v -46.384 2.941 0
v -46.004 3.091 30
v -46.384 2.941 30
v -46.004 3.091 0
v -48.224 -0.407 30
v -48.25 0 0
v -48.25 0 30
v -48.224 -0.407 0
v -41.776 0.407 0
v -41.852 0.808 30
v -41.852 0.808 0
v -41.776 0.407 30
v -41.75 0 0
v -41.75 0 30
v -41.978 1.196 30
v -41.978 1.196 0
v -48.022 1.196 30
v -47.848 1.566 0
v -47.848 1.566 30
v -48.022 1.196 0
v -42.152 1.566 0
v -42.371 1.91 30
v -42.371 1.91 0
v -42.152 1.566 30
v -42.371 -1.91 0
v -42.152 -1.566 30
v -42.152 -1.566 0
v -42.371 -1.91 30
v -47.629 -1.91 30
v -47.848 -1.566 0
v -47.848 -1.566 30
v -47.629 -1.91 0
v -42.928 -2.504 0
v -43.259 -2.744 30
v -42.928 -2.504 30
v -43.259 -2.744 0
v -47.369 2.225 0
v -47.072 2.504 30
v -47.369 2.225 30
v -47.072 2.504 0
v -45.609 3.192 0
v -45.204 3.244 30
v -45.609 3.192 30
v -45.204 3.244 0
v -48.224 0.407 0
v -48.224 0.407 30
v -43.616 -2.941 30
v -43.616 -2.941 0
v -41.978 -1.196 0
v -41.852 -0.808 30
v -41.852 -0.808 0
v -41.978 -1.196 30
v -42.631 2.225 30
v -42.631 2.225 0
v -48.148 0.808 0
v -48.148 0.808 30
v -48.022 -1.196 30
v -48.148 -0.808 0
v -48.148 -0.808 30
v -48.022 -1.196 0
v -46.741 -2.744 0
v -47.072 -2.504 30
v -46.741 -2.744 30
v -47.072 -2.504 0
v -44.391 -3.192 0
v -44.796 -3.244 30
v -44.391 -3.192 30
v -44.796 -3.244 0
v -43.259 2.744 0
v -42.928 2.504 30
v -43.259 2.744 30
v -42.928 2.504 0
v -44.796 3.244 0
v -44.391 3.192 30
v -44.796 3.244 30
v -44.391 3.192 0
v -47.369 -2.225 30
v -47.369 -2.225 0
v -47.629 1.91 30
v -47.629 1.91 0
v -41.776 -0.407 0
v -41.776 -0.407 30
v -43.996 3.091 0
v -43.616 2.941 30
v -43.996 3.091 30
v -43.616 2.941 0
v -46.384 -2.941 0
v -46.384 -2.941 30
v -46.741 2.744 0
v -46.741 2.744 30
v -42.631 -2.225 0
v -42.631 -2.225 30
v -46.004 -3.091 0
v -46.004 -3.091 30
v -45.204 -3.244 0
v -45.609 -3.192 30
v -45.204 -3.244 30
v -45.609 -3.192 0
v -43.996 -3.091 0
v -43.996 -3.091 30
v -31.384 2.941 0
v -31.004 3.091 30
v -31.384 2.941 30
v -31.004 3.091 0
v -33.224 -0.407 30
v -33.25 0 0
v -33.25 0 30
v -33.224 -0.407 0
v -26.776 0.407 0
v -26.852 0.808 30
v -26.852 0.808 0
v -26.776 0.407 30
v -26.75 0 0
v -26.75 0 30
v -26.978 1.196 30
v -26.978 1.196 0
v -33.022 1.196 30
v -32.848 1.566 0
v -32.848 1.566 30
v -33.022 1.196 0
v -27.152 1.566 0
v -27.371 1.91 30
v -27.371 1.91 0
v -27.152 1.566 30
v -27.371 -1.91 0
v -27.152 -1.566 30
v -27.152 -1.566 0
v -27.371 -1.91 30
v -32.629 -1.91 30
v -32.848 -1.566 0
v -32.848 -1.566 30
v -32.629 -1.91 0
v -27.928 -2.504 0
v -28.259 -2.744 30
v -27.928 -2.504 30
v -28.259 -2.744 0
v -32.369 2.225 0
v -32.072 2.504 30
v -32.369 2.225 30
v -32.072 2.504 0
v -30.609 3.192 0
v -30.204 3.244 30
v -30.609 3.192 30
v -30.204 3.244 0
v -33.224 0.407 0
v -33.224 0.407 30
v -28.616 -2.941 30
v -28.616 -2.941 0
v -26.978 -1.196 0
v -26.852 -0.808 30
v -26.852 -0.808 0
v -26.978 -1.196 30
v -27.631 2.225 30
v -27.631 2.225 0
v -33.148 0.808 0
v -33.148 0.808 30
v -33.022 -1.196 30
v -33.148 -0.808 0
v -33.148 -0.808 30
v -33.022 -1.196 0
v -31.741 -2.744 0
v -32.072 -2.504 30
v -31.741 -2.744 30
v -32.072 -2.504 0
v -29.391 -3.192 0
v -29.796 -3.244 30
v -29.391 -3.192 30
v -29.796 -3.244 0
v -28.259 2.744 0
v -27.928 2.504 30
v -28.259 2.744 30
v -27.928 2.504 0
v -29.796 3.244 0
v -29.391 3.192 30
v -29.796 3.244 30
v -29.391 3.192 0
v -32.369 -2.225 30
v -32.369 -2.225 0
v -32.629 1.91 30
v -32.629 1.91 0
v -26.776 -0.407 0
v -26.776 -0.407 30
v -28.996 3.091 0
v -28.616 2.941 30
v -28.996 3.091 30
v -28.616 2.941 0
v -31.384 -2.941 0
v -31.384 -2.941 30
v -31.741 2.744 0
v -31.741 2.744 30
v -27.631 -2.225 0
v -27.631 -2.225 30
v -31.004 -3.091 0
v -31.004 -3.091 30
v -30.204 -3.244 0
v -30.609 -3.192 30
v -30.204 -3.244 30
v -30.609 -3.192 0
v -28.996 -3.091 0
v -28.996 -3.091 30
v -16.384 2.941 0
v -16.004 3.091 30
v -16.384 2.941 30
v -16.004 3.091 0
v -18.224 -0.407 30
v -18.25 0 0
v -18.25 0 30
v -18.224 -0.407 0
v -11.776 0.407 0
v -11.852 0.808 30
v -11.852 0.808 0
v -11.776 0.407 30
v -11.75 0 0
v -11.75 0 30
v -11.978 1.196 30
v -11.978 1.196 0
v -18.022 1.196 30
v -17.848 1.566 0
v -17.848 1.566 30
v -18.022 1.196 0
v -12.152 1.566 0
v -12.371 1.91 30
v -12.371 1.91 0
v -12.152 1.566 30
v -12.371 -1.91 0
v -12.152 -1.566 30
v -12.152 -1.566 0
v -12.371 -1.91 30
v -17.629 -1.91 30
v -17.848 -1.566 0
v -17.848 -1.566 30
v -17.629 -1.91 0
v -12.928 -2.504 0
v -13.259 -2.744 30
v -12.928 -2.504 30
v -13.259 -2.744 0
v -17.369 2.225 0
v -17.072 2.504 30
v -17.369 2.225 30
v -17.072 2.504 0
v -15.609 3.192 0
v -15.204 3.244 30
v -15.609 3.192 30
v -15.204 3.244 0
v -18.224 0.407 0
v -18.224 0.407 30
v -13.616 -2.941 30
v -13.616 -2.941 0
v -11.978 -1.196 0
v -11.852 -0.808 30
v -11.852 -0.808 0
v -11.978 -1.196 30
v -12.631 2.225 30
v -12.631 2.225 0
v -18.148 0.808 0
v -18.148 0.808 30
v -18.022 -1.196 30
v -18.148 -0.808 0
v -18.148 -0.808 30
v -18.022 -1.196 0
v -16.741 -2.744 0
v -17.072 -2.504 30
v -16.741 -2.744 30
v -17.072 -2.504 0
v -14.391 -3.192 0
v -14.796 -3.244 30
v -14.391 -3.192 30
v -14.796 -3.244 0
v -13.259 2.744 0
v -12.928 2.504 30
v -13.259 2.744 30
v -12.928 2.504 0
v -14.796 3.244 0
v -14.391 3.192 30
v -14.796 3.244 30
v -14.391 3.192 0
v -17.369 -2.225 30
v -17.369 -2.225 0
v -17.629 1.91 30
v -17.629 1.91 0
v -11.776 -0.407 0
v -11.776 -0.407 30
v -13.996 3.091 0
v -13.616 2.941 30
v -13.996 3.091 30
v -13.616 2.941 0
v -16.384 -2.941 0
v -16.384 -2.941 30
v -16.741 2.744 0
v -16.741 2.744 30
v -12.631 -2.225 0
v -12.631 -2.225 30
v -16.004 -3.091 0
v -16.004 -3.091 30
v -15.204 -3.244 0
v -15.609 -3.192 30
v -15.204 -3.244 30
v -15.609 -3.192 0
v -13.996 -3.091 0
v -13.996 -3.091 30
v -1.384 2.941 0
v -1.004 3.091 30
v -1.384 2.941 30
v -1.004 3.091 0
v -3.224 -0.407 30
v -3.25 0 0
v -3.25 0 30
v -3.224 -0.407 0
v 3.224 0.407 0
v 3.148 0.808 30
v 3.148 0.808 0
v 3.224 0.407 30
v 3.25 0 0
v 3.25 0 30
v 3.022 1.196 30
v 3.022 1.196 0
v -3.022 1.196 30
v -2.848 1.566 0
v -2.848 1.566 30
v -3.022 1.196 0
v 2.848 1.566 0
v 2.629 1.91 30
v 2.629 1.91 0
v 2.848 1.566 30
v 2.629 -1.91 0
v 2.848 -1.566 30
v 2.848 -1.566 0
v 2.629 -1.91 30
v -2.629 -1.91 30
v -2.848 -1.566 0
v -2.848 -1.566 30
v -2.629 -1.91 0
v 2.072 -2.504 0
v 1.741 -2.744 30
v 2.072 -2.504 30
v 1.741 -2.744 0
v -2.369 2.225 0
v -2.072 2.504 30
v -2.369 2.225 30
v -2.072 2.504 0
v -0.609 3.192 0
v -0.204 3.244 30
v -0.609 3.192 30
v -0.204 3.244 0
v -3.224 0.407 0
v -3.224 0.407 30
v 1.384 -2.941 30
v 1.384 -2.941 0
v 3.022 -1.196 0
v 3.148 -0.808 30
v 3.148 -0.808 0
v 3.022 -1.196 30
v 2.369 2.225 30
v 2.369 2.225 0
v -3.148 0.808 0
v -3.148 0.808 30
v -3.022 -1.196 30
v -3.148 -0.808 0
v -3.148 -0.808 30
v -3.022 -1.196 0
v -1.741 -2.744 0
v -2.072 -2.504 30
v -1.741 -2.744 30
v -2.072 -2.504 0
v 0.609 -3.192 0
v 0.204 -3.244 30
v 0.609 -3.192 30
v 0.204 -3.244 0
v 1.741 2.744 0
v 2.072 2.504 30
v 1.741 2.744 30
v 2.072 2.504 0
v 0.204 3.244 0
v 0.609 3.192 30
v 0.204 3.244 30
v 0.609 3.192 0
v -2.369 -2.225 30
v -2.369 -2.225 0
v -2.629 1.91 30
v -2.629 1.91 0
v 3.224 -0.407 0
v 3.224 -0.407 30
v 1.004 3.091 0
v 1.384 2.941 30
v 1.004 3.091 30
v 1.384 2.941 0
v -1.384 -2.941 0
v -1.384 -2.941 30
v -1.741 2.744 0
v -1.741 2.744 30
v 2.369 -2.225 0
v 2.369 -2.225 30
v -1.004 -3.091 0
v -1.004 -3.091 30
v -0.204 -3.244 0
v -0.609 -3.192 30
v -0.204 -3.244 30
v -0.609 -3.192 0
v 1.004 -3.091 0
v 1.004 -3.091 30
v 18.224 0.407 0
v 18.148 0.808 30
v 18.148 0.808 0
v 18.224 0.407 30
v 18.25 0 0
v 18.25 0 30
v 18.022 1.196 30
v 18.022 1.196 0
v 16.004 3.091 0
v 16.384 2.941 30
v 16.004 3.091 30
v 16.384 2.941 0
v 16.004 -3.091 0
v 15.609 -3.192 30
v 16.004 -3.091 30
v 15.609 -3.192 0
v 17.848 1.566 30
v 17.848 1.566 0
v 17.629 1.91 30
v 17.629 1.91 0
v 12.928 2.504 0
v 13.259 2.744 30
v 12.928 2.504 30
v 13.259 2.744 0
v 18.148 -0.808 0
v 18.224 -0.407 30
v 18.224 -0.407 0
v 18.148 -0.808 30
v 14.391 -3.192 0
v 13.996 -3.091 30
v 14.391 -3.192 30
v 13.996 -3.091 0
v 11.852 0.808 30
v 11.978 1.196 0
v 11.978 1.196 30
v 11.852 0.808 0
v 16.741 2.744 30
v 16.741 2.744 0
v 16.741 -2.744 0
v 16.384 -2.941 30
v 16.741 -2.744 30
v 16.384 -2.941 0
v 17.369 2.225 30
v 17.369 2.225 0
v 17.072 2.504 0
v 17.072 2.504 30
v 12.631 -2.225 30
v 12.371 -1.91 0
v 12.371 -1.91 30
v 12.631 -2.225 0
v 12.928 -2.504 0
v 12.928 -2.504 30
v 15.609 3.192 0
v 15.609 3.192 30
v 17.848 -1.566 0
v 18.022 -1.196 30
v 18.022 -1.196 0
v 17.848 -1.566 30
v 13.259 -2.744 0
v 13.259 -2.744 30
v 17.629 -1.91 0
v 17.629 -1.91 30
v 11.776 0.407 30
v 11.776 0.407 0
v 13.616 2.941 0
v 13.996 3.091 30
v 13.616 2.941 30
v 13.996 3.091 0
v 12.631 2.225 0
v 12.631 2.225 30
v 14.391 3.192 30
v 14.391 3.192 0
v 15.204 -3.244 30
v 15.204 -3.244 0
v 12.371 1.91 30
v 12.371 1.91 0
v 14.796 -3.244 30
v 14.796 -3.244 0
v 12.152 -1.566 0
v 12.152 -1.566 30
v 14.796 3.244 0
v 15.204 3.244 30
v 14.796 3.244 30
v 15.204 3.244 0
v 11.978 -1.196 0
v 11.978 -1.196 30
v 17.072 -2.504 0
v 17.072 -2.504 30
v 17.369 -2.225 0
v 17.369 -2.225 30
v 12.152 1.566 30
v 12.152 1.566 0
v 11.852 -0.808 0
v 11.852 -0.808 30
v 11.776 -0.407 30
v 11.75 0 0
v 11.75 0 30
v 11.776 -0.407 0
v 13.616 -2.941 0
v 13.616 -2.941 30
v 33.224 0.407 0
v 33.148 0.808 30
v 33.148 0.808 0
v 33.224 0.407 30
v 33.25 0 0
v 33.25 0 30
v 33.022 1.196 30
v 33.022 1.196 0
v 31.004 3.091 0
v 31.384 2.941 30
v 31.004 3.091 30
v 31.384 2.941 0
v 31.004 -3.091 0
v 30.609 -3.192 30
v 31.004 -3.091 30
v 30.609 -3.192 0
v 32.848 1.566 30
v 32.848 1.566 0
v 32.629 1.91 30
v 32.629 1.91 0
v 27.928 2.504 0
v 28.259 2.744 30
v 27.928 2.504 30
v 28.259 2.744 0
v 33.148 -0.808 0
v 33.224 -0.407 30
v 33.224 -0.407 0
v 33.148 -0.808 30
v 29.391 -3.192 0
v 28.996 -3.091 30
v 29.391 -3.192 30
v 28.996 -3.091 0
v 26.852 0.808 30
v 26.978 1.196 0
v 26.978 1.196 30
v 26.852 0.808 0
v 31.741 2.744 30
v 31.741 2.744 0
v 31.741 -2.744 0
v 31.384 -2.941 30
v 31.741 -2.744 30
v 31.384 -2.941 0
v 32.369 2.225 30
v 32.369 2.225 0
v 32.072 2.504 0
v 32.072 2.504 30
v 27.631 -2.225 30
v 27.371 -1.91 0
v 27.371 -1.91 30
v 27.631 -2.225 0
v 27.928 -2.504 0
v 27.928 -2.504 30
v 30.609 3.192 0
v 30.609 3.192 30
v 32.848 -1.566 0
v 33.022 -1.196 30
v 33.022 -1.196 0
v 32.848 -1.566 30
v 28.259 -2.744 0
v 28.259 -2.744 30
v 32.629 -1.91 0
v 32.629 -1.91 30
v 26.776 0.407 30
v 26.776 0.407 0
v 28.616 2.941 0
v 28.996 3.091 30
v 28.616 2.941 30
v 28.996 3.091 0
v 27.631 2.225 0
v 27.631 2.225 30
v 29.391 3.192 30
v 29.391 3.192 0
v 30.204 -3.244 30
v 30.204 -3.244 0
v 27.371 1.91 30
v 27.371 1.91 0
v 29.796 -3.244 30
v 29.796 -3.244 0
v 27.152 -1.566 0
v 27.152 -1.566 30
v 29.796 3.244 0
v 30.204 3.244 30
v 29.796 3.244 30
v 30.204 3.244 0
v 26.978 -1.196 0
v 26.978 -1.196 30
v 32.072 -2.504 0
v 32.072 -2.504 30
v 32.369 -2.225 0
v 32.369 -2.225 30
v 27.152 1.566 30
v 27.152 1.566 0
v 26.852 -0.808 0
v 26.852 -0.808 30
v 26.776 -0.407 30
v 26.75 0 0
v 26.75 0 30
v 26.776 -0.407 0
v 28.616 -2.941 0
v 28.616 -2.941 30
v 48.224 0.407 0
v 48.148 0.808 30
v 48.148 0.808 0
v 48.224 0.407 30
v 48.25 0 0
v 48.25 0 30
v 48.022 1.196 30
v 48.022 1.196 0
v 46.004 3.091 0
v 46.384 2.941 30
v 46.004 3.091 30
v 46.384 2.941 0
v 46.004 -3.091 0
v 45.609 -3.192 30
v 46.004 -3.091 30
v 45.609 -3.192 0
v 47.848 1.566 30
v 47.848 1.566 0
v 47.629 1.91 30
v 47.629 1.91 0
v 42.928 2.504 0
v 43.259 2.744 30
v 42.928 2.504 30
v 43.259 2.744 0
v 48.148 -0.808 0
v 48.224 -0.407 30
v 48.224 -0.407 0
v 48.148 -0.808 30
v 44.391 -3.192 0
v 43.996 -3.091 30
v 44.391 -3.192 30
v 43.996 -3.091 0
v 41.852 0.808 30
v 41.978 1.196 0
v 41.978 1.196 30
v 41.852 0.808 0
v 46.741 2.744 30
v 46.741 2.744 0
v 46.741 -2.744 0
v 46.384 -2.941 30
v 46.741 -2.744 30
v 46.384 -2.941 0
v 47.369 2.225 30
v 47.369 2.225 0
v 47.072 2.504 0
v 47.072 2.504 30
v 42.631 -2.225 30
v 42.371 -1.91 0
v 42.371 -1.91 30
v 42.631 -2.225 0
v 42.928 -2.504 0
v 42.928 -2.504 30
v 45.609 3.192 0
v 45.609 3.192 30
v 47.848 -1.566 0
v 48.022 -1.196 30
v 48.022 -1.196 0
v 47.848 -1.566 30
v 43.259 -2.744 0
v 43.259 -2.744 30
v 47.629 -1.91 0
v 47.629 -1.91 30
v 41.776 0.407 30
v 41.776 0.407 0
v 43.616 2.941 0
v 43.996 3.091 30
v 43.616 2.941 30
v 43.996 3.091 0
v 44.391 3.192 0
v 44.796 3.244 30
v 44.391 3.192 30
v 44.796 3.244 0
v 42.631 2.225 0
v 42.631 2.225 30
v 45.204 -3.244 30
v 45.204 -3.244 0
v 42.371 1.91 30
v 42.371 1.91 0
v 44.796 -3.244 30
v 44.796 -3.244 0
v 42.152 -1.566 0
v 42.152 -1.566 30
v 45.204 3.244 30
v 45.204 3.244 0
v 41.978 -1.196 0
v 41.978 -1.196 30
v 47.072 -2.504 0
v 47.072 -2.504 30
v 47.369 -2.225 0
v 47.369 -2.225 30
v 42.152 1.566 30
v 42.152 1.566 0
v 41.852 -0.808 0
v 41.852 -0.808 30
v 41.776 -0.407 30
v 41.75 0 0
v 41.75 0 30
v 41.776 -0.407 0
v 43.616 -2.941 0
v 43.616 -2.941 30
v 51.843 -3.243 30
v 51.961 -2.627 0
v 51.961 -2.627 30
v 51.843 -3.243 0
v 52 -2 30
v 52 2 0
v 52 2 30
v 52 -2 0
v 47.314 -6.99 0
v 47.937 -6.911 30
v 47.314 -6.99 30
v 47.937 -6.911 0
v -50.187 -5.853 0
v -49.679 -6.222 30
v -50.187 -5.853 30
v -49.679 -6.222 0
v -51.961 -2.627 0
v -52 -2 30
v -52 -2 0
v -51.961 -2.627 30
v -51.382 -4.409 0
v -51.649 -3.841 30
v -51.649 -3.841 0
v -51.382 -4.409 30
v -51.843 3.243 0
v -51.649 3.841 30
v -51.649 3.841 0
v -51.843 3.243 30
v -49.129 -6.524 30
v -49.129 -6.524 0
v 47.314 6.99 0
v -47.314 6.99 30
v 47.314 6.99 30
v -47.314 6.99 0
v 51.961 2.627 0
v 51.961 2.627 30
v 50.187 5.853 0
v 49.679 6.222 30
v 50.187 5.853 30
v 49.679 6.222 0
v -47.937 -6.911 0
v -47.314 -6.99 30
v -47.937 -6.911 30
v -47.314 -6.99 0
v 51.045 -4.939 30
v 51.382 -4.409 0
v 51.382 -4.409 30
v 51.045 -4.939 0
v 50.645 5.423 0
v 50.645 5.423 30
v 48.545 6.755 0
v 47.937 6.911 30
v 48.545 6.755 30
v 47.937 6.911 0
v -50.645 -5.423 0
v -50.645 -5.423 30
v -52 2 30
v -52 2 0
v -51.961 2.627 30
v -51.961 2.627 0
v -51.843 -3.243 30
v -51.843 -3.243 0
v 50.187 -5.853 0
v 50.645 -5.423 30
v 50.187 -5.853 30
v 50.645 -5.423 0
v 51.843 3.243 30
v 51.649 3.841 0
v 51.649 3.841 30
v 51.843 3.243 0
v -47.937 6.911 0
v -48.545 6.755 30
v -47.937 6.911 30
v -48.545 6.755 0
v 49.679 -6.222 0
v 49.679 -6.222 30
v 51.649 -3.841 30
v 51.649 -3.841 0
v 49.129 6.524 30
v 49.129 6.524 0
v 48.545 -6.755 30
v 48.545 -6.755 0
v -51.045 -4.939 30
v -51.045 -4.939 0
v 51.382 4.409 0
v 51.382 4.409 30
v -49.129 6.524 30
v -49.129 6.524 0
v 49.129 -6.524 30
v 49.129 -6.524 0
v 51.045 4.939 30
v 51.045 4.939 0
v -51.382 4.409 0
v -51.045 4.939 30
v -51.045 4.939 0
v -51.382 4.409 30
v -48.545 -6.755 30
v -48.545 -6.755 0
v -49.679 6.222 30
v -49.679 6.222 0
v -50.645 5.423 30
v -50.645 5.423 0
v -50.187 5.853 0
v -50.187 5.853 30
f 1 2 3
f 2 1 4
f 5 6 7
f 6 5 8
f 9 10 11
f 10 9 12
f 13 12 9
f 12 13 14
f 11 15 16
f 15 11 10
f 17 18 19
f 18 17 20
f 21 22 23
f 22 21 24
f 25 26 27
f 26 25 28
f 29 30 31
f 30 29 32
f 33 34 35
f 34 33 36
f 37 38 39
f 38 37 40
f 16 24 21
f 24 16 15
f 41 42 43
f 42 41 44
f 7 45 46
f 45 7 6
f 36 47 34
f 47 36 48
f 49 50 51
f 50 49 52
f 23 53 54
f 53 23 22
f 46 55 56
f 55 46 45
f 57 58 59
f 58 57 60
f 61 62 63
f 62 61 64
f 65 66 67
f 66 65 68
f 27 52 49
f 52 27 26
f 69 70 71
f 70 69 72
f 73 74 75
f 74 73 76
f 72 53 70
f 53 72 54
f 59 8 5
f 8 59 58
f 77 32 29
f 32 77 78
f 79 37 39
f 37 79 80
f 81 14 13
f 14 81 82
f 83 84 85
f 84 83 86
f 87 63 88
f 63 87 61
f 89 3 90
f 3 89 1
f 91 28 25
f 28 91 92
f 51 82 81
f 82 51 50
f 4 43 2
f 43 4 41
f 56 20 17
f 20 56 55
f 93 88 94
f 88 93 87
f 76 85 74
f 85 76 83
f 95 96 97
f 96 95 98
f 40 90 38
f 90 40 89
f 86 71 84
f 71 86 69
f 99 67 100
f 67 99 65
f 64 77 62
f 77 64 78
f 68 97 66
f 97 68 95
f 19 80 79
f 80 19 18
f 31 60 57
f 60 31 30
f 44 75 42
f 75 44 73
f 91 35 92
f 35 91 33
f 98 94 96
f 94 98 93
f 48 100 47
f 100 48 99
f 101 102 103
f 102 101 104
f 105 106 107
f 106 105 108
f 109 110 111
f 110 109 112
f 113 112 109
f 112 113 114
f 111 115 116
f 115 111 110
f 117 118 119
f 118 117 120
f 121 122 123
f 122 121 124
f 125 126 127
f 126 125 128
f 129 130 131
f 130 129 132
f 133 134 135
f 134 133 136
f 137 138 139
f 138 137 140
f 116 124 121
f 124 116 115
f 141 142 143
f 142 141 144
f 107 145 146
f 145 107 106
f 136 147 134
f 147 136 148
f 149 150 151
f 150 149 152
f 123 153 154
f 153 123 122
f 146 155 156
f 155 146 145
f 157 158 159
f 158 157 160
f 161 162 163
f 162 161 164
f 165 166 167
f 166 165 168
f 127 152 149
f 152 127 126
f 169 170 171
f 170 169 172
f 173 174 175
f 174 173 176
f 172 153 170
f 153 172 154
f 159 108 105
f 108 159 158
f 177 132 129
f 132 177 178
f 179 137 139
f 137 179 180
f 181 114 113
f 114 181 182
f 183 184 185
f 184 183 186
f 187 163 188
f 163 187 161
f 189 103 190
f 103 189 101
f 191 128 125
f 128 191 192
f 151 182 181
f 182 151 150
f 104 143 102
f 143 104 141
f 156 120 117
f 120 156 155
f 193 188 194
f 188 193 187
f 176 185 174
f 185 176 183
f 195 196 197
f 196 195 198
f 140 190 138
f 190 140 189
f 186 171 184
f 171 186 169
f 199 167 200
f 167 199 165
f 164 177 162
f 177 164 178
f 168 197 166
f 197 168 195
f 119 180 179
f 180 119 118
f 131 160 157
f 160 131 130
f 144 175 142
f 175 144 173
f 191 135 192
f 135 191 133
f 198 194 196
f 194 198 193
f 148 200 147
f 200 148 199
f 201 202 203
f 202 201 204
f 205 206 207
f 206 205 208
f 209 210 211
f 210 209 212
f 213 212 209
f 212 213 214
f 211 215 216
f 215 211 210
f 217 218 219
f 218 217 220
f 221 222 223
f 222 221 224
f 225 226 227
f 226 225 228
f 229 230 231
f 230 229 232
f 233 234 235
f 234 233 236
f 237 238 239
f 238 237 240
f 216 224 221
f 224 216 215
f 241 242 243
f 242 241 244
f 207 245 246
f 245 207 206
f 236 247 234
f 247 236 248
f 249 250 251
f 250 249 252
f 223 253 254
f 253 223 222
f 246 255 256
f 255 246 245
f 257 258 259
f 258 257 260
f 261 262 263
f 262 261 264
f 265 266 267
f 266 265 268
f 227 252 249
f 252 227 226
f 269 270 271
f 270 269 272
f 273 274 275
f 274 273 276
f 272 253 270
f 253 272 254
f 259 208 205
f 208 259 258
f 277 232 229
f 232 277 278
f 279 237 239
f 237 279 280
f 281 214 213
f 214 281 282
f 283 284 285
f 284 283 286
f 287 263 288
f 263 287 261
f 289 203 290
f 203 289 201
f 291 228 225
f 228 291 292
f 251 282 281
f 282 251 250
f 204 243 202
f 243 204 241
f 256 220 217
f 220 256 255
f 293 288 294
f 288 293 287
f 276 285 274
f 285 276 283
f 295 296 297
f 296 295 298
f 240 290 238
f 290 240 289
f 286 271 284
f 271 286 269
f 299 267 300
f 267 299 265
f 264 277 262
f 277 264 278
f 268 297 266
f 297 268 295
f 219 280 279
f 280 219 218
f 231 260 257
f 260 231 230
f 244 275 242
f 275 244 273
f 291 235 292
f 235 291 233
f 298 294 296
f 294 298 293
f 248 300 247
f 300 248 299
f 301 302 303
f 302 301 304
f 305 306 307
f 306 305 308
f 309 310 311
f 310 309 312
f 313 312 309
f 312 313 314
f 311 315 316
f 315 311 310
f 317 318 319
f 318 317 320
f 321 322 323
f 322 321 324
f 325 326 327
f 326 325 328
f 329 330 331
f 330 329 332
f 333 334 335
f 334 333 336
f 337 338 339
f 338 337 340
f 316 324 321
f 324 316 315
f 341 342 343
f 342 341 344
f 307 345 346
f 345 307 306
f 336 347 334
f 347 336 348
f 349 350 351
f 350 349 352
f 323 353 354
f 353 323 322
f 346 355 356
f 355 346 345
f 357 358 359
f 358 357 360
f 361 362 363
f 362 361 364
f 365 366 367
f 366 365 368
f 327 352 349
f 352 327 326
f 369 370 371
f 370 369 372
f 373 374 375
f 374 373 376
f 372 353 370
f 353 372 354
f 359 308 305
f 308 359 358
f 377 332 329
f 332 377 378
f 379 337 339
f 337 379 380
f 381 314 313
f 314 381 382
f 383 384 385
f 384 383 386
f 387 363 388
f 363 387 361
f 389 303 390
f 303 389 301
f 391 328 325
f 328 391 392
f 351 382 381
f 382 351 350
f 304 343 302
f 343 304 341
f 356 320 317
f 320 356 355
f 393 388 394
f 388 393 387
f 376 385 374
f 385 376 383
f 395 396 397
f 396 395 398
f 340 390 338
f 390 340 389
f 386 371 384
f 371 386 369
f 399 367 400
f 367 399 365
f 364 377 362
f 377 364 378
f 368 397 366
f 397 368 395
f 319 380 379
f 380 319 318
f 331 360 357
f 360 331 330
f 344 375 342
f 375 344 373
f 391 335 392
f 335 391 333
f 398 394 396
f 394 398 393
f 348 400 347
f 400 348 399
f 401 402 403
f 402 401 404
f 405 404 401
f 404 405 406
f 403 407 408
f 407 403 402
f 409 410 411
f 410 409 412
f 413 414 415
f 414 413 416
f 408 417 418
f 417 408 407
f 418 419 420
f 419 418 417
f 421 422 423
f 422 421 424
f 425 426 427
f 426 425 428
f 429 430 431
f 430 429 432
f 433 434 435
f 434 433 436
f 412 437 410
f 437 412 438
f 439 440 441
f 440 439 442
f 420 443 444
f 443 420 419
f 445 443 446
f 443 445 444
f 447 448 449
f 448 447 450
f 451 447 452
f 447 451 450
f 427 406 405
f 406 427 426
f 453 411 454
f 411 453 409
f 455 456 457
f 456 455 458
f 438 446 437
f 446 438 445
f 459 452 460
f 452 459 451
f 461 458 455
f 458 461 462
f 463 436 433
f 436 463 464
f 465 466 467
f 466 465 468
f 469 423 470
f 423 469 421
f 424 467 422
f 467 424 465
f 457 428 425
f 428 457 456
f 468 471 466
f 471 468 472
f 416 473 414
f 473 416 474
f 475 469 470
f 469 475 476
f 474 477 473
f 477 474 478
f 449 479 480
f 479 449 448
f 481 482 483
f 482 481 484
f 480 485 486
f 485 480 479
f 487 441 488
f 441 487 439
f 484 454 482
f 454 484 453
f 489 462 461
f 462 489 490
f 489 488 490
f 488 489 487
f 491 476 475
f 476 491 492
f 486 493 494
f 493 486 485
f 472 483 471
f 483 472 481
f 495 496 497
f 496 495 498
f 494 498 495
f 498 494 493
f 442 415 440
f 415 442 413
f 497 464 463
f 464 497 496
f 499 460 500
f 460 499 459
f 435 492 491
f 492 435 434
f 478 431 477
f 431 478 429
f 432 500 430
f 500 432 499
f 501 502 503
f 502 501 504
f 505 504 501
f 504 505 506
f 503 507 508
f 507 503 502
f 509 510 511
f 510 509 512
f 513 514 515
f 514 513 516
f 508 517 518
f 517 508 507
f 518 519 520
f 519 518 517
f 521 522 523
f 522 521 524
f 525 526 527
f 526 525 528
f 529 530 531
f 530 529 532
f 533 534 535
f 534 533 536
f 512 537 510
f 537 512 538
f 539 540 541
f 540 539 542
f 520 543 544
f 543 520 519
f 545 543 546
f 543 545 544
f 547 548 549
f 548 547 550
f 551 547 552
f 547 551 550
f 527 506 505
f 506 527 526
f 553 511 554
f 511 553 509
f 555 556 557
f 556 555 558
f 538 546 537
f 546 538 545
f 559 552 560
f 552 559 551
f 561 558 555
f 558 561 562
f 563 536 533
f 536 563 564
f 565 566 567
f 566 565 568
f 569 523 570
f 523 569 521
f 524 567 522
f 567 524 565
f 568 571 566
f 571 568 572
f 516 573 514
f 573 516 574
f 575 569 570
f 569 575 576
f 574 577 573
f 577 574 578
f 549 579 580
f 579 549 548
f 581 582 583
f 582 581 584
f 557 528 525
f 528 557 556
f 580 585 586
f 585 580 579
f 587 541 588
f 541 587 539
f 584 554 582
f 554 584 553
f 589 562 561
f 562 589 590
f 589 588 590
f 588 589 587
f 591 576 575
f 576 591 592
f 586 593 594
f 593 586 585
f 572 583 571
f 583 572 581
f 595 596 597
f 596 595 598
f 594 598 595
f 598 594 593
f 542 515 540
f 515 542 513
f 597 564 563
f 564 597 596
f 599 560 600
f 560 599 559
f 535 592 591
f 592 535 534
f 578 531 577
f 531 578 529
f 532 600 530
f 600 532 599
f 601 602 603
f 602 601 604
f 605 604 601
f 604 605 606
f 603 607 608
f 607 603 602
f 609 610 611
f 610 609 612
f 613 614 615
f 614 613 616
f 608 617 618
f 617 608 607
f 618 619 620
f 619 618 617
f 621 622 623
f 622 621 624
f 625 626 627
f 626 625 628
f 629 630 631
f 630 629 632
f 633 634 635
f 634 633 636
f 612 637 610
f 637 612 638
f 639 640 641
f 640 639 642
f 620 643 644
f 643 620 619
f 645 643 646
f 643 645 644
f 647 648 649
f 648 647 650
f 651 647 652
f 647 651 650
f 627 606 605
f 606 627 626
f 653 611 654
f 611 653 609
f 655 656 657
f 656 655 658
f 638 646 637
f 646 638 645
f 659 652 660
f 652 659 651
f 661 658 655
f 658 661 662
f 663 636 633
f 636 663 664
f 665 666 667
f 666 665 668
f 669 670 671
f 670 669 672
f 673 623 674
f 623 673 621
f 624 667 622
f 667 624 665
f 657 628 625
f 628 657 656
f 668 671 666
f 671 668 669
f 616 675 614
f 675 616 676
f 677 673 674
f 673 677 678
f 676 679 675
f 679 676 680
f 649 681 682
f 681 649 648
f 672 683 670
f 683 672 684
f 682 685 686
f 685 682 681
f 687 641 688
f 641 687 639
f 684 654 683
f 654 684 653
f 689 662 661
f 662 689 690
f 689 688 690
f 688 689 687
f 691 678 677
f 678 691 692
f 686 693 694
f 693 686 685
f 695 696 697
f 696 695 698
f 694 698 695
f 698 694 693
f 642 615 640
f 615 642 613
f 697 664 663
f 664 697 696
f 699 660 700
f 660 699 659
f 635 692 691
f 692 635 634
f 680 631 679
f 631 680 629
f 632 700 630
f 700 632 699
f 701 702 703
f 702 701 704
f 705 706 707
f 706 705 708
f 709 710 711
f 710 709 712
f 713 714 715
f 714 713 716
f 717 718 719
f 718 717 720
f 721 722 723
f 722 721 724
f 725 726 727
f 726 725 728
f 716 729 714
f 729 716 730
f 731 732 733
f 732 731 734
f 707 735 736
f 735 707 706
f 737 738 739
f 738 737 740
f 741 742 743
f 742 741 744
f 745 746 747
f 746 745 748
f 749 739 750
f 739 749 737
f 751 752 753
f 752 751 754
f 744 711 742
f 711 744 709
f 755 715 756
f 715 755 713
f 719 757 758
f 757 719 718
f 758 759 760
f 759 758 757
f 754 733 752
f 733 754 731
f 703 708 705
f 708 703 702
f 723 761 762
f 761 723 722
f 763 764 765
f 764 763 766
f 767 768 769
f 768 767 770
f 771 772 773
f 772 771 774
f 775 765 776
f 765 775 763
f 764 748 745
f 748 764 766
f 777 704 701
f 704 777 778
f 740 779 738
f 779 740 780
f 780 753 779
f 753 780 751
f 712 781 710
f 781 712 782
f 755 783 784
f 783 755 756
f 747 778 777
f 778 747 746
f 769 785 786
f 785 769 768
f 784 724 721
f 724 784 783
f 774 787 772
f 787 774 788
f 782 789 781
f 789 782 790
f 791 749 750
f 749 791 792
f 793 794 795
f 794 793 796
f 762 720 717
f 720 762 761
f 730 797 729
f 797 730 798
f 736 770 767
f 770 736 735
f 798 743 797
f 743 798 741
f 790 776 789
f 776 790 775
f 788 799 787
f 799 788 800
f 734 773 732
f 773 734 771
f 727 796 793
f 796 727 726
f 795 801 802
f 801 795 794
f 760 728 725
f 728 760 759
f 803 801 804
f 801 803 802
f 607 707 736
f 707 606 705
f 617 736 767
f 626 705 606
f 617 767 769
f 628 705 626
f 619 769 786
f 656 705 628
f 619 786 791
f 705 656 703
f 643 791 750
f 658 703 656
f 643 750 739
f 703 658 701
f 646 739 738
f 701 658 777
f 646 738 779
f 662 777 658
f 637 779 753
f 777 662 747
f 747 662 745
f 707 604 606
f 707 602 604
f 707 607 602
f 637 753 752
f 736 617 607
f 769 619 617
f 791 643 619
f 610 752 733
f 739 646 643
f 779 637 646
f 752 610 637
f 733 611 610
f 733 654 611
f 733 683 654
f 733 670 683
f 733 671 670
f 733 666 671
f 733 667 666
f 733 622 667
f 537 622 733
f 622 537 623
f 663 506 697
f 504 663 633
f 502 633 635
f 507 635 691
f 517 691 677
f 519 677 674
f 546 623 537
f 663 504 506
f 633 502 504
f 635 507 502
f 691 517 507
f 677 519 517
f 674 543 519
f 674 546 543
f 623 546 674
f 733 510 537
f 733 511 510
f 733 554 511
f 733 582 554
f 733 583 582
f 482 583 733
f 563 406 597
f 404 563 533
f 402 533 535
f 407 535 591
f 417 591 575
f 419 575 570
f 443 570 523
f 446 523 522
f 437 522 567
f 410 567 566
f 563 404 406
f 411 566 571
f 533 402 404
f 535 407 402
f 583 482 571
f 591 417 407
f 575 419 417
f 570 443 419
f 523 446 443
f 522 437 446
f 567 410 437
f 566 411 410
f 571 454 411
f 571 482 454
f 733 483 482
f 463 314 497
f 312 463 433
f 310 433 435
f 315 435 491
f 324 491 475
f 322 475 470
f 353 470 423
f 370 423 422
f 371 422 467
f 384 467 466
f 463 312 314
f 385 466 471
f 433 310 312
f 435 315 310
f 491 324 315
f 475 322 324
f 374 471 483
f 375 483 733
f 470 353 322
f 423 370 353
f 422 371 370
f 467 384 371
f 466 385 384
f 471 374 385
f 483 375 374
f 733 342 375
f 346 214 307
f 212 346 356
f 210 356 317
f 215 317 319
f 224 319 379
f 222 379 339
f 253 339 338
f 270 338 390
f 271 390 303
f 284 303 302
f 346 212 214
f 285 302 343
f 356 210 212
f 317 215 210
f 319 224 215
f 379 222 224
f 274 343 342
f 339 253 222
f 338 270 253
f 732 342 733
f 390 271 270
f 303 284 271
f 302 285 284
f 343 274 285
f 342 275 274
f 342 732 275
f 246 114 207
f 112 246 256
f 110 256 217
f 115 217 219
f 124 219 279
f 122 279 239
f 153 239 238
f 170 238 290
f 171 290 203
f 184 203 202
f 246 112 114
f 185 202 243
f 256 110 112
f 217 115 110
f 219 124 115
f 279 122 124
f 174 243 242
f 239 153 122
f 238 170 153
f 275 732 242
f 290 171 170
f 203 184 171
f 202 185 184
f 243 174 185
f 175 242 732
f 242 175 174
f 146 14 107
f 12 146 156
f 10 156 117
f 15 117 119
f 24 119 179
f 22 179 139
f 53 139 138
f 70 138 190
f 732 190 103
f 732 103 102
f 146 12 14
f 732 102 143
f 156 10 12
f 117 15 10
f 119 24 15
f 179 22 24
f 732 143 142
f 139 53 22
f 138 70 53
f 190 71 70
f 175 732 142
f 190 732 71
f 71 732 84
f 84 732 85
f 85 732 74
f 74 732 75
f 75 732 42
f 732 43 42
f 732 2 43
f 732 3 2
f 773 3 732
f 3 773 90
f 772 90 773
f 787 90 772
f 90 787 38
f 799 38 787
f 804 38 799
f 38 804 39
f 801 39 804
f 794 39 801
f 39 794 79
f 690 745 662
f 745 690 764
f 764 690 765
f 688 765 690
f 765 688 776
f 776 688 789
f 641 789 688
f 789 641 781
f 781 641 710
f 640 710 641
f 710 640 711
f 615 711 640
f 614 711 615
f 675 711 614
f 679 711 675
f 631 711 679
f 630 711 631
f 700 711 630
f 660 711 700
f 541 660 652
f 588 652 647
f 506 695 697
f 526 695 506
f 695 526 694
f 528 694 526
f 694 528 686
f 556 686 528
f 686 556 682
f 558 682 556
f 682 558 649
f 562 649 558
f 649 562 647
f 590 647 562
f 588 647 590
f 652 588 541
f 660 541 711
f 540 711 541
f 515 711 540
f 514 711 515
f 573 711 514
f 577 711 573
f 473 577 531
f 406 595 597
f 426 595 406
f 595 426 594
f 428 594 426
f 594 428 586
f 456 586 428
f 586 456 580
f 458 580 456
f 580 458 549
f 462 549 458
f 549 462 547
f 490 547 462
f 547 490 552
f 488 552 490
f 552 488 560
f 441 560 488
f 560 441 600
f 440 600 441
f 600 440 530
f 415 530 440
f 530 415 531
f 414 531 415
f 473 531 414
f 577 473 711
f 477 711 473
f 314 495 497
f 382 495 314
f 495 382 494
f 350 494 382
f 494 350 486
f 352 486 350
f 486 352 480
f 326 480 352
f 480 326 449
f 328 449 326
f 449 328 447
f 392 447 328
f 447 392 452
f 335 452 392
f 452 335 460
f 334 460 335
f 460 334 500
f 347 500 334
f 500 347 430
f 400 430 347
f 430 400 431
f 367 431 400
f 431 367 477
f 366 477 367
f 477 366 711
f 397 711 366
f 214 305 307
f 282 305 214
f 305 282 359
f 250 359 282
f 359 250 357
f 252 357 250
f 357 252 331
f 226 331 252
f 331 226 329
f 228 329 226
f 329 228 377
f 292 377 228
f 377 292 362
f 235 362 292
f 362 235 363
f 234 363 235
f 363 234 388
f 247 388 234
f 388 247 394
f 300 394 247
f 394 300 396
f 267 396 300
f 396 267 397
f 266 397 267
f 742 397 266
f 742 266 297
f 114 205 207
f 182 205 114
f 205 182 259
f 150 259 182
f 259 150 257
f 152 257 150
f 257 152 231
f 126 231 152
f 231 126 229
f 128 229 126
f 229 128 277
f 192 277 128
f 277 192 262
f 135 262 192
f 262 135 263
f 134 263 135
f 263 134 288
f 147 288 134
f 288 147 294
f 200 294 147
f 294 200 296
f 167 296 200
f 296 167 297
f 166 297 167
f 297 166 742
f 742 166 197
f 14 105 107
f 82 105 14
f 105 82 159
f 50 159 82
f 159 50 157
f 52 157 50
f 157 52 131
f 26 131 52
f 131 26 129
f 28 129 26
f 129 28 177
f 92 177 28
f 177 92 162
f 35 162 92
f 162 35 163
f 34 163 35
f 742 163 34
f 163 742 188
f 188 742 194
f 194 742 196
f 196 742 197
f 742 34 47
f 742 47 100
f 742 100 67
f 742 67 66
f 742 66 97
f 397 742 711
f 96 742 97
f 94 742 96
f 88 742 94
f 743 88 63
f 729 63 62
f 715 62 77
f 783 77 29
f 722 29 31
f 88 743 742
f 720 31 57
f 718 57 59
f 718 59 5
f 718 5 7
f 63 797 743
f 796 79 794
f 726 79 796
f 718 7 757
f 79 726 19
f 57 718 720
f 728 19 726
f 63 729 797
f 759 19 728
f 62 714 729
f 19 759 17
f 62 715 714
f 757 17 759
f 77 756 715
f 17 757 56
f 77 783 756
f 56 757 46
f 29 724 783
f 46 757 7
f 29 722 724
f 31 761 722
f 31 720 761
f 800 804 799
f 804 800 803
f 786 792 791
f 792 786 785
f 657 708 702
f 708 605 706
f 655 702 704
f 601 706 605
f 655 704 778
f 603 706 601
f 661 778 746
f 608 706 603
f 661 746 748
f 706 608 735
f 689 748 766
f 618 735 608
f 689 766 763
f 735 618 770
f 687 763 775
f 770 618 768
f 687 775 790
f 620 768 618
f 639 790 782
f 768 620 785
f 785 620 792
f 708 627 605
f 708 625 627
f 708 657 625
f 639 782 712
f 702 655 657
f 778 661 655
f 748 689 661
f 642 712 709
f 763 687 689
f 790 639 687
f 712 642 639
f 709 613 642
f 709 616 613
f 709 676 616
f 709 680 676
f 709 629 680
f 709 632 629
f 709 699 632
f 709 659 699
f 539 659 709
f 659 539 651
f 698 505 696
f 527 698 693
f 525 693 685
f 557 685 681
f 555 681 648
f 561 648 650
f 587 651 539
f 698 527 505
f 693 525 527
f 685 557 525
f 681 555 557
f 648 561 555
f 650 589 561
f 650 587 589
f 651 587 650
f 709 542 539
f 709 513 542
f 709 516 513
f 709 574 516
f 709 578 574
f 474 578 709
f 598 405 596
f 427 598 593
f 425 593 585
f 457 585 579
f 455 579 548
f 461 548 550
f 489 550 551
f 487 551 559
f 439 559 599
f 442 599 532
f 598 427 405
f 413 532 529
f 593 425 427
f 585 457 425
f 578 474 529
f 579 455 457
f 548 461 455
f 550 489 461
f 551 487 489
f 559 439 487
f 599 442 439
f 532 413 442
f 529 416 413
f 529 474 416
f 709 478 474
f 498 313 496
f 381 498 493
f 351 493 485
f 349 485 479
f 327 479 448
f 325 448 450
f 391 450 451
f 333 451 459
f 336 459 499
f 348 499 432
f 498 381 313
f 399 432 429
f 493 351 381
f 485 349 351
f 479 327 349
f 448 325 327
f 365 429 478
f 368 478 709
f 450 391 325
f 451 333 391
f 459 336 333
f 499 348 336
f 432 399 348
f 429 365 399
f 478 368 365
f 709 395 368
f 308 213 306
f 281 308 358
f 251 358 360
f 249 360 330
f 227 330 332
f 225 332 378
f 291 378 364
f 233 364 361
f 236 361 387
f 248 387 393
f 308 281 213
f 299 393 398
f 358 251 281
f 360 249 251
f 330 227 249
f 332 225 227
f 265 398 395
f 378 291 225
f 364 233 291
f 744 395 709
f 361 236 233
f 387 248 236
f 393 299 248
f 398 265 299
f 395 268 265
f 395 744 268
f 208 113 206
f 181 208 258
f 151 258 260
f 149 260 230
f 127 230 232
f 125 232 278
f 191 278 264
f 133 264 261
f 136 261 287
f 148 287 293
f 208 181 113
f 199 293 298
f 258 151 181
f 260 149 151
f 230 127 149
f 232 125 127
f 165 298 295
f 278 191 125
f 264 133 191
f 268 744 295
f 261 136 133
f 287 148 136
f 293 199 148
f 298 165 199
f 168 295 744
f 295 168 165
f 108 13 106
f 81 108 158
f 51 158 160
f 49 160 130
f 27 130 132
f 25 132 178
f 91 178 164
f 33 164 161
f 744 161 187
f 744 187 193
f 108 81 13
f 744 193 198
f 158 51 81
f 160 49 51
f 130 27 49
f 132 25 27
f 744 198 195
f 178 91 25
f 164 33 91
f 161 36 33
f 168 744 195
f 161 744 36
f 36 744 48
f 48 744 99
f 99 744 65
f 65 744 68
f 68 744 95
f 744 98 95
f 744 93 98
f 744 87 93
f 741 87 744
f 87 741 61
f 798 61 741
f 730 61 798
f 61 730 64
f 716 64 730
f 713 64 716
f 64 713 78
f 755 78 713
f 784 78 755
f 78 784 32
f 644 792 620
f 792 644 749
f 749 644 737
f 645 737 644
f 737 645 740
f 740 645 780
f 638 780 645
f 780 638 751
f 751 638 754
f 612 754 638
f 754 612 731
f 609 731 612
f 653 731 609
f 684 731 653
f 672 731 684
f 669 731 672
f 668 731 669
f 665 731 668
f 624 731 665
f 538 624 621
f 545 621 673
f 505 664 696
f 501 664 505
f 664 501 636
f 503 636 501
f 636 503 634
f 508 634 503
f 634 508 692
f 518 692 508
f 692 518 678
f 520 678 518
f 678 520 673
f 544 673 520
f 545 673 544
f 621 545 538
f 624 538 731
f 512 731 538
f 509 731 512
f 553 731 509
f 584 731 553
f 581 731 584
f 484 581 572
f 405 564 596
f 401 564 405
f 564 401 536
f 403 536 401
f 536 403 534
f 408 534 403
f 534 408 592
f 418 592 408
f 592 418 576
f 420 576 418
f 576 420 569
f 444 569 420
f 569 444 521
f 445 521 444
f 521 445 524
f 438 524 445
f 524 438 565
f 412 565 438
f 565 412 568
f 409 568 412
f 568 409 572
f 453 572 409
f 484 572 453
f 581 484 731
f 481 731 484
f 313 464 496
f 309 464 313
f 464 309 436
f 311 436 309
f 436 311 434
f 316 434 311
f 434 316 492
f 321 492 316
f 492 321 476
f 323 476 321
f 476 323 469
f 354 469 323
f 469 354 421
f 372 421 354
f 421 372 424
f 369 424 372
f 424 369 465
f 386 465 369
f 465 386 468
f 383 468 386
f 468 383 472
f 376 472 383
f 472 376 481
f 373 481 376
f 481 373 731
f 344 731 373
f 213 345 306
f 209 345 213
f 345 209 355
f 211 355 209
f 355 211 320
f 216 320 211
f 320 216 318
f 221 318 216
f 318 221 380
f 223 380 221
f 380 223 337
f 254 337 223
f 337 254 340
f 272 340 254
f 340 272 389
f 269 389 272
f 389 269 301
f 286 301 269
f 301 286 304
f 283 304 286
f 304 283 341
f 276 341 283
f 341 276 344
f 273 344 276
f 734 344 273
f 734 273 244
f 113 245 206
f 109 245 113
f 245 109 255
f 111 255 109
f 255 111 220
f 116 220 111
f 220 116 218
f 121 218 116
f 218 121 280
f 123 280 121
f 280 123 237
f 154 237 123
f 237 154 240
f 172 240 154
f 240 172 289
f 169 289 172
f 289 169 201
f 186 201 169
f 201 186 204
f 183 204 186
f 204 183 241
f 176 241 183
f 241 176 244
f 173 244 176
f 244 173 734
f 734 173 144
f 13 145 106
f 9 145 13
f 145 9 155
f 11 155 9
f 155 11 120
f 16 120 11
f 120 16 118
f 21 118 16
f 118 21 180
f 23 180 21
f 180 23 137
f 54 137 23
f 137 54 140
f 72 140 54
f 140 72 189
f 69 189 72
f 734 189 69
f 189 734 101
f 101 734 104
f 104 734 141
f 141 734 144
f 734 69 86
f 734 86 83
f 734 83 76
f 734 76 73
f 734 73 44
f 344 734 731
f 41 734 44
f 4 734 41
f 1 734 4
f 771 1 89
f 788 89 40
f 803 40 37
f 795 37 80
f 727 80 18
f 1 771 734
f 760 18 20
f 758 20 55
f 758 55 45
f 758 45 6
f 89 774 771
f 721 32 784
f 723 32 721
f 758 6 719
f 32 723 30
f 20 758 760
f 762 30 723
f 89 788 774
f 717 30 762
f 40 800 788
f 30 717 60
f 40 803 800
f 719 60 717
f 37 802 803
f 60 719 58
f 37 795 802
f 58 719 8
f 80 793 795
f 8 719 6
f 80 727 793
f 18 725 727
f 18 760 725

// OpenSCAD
$fn = 50;


difference() {
	union() {
		hull() {
			translate(v = [-47.0000000000, 2.0000000000, 0]) {
				cylinder(h = 30, r = 5);
			}
			translate(v = [47.0000000000, 2.0000000000, 0]) {
				cylinder(h = 30, r = 5);
			}
			translate(v = [-47.0000000000, -2.0000000000, 0]) {
				cylinder(h = 30, r = 5);
			}
			translate(v = [47.0000000000, -2.0000000000, 0]) {
				cylinder(h = 30, r = 5);
			}
		}
	}
	union() {
		translate(v = [-45.0000000000, 0.0000000000, 0]) {
			translate(v = [0, 0, -100]) {
				cylinder(h = 200, r = 3.2500000000);
			}
		}
		translate(v = [-30.0000000000, 0.0000000000, 0]) {
			translate(v = [0, 0, -100]) {
				cylinder(h = 200, r = 3.2500000000);
			}
		}
		translate(v = [-15.0000000000, 0.0000000000, 0]) {
			translate(v = [0, 0, -100]) {
				cylinder(h = 200, r = 3.2500000000);
			}
		}
		translate(v = [0, 0, -100]) {
			cylinder(h = 200, r = 3.2500000000);
		}
		translate(v = [15.0000000000, 0.0000000000, 0]) {
			translate(v = [0, 0, -100]) {
				cylinder(h = 200, r = 3.2500000000);
			}
		}
		translate(v = [30.0000000000, 0.0000000000, 0]) {
			translate(v = [0, 0, -100]) {
				cylinder(h = 200, r = 3.2500000000);
			}
		}
		translate(v = [45.0000000000, 0.0000000000, 0]) {
			translate(v = [0, 0, -100]) {
				cylinder(h = 200, r = 3.2500000000);
			}
		}
	}
}
